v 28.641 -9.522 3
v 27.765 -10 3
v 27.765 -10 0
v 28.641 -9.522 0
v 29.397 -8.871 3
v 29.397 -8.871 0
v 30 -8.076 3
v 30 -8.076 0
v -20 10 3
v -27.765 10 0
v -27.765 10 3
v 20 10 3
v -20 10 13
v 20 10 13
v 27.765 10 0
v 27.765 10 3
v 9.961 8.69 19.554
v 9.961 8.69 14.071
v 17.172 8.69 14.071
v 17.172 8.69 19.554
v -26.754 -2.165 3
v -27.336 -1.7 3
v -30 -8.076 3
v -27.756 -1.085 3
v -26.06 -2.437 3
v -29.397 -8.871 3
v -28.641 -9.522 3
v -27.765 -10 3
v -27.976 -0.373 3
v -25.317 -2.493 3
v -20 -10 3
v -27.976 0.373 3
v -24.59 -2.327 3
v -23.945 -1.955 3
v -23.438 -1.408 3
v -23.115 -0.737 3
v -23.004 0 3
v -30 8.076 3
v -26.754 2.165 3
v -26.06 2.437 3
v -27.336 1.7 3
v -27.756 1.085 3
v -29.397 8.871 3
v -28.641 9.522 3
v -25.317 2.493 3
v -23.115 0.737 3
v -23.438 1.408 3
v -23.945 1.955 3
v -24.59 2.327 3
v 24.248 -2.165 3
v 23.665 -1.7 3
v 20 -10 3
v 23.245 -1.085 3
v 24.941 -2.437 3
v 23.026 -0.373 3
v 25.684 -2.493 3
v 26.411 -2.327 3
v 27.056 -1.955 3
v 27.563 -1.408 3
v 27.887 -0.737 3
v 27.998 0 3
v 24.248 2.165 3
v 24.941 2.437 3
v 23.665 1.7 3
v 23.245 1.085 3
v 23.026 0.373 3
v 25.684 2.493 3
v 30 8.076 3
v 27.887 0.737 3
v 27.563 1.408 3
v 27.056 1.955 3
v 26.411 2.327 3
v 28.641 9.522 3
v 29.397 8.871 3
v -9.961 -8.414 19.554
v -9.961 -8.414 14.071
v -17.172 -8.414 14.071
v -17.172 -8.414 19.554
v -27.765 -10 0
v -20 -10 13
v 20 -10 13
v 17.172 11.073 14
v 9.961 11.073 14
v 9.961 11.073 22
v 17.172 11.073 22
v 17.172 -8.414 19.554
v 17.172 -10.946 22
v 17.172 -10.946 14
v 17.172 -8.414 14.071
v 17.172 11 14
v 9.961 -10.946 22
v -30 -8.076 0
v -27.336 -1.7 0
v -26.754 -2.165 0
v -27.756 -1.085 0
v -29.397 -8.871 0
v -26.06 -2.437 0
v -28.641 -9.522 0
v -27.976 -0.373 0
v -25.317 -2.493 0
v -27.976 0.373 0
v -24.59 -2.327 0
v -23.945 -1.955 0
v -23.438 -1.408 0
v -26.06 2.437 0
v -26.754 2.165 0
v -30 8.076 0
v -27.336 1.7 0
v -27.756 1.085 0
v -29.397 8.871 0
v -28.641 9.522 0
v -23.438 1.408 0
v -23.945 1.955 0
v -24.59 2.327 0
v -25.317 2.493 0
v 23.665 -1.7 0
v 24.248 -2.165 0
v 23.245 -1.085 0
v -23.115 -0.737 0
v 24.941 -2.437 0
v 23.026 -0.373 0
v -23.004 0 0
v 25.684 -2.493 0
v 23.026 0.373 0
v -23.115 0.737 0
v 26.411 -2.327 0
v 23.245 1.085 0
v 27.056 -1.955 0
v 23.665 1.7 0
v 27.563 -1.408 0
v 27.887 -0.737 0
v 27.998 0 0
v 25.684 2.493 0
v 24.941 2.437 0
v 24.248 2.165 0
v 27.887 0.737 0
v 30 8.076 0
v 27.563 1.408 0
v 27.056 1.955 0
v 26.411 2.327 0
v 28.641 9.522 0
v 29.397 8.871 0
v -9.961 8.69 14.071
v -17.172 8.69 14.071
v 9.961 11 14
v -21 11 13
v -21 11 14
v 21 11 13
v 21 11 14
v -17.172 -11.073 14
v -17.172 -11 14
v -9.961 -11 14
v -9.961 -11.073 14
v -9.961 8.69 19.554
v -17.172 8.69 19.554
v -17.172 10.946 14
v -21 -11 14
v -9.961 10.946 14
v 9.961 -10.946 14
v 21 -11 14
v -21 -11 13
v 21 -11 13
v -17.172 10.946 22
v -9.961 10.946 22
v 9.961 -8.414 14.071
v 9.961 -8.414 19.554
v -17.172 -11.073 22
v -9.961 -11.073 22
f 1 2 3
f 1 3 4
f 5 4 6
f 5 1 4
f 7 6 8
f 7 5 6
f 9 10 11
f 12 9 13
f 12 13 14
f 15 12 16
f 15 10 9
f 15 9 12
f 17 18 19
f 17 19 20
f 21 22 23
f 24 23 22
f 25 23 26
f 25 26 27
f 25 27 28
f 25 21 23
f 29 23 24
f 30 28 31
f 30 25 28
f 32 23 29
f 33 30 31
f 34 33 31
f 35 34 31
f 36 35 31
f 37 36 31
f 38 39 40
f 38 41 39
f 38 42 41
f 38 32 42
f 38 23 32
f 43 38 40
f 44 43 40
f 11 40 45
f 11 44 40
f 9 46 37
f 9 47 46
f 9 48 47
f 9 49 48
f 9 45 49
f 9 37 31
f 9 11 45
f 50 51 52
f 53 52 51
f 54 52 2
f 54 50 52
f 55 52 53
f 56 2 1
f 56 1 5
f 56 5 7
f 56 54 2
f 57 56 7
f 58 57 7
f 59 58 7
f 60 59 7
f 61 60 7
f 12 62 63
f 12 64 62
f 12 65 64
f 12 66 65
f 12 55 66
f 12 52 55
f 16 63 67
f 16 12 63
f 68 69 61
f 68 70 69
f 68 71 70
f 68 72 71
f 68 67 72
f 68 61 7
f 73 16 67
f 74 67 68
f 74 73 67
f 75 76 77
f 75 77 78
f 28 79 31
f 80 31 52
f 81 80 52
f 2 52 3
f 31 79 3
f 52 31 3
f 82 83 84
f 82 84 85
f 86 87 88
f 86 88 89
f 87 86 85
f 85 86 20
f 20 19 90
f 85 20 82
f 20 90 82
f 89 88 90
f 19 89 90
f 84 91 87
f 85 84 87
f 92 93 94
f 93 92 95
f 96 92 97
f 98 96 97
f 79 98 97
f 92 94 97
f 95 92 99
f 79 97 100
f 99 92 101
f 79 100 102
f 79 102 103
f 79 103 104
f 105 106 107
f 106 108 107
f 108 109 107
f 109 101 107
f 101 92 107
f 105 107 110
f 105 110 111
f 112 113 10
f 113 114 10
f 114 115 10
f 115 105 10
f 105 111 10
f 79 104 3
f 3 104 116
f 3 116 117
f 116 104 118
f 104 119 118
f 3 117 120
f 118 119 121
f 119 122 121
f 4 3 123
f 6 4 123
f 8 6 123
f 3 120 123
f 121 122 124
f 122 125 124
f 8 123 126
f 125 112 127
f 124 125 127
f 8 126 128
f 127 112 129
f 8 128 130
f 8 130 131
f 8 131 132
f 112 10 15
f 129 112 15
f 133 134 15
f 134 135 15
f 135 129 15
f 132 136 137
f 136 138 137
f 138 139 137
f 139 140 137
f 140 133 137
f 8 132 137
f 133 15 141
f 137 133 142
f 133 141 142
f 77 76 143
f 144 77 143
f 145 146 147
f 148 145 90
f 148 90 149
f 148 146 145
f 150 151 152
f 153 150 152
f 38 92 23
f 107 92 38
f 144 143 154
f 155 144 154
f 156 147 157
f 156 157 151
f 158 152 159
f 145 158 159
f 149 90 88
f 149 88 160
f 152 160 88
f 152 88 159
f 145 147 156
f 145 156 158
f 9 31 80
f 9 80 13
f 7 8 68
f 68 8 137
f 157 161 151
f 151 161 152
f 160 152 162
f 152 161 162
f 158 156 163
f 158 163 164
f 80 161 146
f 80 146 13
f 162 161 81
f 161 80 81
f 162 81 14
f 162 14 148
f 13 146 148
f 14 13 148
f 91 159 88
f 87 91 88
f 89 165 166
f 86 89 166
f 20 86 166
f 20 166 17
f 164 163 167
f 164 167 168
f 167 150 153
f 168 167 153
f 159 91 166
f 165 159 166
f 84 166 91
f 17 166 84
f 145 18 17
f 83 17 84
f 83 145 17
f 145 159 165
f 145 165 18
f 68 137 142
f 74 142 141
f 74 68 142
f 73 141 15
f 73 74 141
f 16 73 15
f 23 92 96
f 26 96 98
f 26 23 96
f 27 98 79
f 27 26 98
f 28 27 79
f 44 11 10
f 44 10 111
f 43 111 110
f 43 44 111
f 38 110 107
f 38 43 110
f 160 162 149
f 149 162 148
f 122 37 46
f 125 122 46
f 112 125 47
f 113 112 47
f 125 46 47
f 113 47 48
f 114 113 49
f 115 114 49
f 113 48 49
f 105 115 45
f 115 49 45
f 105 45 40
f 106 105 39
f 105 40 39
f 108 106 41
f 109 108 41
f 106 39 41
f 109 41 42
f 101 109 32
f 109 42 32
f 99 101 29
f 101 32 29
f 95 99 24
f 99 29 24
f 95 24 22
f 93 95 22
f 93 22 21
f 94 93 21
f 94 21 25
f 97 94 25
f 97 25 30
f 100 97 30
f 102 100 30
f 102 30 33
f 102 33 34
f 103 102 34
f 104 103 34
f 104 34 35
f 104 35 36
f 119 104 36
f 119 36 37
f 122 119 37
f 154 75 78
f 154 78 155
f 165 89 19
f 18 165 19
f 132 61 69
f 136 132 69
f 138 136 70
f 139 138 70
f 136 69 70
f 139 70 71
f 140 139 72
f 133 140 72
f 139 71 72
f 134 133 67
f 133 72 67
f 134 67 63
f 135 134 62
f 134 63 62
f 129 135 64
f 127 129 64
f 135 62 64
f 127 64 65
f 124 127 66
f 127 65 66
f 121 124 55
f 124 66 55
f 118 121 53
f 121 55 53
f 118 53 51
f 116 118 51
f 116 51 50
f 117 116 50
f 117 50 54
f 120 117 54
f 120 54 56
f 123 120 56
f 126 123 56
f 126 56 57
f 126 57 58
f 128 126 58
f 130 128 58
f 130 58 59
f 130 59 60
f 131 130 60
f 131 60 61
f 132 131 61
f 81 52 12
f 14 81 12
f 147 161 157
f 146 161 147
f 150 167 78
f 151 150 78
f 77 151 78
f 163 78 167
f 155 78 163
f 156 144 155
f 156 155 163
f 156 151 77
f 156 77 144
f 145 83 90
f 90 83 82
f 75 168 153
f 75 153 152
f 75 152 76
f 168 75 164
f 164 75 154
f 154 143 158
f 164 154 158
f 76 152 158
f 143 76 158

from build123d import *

# Parameters (mm, degrees)
SKETCH_W        = 60
SKETCH_H        = 20
PAD_DEPTH       = 3
SKETCH001_W     = 40
SKETCH001_H     = 20
PAD001_DEPTH    = 10
SKETCH002_W     = 42
SKETCH002_H     = 22
PAD002_DEPTH    = 1
SKETCH003_W     = 7.210509
SKETCH003_H     = 22.018964
PAD003_DEPTH    = 8
SKETCH010_W     = 17.104093
SKETCH010_H     = 5.482681
POCKET_DEPTH    = 40
POCKET001_DEPTH = 5
SKETCH012_R     = 2.5
POCKET002_DEPTH = 5


with BuildPart() as part:
    # Sketch → Pad (new body)
    with BuildSketch(Plane.XY):
        Rectangle(SKETCH_W, SKETCH_H)
    extrude(amount=PAD_DEPTH)

    # Sketch001 (on Face6 of Pad) → Pad001 (join)
    with BuildSketch(Plane.XY.offset(3)):
        Rectangle(SKETCH001_W, SKETCH001_H)
    extrude(amount=PAD001_DEPTH)

    # Sketch002 → Pad002 (join)
    with BuildSketch(Plane.XY.offset(13)):
        Rectangle(SKETCH002_W, SKETCH002_H)
    extrude(amount=PAD002_DEPTH)

    # Sketch003 (on Face15 of Pad002) → Pad003 (join)
    with BuildSketch(Plane.XY.offset(14)):
        with Locations((-13.566278, -0.063386)):
            Rectangle(SKETCH003_W, SKETCH003_H)
        with Locations((13.566278, 0.063386)):
            Rectangle(SKETCH003_W, SKETCH003_H)
    extrude(amount=PAD003_DEPTH)

    # Sketch010 (on Face21 of Pad003) → Pocket (cut, symmetric)
    with BuildSketch(Plane.YZ.offset(-9.961024)):
        with Locations((0.137935, 16.812696)):
            Rectangle(SKETCH010_W, SKETCH010_H)
    extrude(amount=POCKET_DEPTH, both=True, mode=Mode.SUBTRACT)

    # Sketch011 (on Face10 of Pocket) → Pocket001 (cut)
    with BuildSketch(Plane.XY.offset(3)):
        with BuildLine():
            ThreePointArc((-26.414192, 10.338834), (-29.320565, 8.950898), (-30.662811, 6.023143))
            Line((-30.662811, 6.023143), (-30.662811, 10.298891))
            Line((-30.662811, 10.298891), (-26.414192, 10.338834))
        make_face()
        with BuildLine():
            ThreePointArc((-30.662811, -6.023143), (-29.320565, -8.950898), (-26.414192, -10.338834))
            Line((-30.662811, -10.298891), (-26.414192, -10.338834))
            Line((-30.662811, -6.023143), (-30.662811, -10.298891))
        make_face()
        with BuildLine():
            ThreePointArc((30.662811, 6.023143), (29.320565, 8.950898), (26.414192, 10.338834))
            Line((30.662811, 10.298891), (26.414192, 10.338834))
            Line((30.662811, 6.023143), (30.662811, 10.298891))
        make_face()
        with BuildLine():
            ThreePointArc((26.414192, -10.338834), (29.320565, -8.950898), (30.662811, -6.023143))
            Line((30.662811, -6.023143), (30.662811, -10.298891))
            Line((30.662811, -10.298891), (26.414192, -10.338834))
        make_face()
    extrude(amount=-POCKET001_DEPTH, mode=Mode.SUBTRACT)

    # Sketch012 (on Face12 of Pocket001) → Pocket002 (cut)
    with BuildSketch(Plane.XY.offset(3)):
        with Locations((-25.503695, 0)):
            Circle(SKETCH012_R)
        with Locations((25.497604, 0)):
            Circle(SKETCH012_R)
    extrude(amount=-POCKET002_DEPTH, mode=Mode.SUBTRACT)


solid = part.part
